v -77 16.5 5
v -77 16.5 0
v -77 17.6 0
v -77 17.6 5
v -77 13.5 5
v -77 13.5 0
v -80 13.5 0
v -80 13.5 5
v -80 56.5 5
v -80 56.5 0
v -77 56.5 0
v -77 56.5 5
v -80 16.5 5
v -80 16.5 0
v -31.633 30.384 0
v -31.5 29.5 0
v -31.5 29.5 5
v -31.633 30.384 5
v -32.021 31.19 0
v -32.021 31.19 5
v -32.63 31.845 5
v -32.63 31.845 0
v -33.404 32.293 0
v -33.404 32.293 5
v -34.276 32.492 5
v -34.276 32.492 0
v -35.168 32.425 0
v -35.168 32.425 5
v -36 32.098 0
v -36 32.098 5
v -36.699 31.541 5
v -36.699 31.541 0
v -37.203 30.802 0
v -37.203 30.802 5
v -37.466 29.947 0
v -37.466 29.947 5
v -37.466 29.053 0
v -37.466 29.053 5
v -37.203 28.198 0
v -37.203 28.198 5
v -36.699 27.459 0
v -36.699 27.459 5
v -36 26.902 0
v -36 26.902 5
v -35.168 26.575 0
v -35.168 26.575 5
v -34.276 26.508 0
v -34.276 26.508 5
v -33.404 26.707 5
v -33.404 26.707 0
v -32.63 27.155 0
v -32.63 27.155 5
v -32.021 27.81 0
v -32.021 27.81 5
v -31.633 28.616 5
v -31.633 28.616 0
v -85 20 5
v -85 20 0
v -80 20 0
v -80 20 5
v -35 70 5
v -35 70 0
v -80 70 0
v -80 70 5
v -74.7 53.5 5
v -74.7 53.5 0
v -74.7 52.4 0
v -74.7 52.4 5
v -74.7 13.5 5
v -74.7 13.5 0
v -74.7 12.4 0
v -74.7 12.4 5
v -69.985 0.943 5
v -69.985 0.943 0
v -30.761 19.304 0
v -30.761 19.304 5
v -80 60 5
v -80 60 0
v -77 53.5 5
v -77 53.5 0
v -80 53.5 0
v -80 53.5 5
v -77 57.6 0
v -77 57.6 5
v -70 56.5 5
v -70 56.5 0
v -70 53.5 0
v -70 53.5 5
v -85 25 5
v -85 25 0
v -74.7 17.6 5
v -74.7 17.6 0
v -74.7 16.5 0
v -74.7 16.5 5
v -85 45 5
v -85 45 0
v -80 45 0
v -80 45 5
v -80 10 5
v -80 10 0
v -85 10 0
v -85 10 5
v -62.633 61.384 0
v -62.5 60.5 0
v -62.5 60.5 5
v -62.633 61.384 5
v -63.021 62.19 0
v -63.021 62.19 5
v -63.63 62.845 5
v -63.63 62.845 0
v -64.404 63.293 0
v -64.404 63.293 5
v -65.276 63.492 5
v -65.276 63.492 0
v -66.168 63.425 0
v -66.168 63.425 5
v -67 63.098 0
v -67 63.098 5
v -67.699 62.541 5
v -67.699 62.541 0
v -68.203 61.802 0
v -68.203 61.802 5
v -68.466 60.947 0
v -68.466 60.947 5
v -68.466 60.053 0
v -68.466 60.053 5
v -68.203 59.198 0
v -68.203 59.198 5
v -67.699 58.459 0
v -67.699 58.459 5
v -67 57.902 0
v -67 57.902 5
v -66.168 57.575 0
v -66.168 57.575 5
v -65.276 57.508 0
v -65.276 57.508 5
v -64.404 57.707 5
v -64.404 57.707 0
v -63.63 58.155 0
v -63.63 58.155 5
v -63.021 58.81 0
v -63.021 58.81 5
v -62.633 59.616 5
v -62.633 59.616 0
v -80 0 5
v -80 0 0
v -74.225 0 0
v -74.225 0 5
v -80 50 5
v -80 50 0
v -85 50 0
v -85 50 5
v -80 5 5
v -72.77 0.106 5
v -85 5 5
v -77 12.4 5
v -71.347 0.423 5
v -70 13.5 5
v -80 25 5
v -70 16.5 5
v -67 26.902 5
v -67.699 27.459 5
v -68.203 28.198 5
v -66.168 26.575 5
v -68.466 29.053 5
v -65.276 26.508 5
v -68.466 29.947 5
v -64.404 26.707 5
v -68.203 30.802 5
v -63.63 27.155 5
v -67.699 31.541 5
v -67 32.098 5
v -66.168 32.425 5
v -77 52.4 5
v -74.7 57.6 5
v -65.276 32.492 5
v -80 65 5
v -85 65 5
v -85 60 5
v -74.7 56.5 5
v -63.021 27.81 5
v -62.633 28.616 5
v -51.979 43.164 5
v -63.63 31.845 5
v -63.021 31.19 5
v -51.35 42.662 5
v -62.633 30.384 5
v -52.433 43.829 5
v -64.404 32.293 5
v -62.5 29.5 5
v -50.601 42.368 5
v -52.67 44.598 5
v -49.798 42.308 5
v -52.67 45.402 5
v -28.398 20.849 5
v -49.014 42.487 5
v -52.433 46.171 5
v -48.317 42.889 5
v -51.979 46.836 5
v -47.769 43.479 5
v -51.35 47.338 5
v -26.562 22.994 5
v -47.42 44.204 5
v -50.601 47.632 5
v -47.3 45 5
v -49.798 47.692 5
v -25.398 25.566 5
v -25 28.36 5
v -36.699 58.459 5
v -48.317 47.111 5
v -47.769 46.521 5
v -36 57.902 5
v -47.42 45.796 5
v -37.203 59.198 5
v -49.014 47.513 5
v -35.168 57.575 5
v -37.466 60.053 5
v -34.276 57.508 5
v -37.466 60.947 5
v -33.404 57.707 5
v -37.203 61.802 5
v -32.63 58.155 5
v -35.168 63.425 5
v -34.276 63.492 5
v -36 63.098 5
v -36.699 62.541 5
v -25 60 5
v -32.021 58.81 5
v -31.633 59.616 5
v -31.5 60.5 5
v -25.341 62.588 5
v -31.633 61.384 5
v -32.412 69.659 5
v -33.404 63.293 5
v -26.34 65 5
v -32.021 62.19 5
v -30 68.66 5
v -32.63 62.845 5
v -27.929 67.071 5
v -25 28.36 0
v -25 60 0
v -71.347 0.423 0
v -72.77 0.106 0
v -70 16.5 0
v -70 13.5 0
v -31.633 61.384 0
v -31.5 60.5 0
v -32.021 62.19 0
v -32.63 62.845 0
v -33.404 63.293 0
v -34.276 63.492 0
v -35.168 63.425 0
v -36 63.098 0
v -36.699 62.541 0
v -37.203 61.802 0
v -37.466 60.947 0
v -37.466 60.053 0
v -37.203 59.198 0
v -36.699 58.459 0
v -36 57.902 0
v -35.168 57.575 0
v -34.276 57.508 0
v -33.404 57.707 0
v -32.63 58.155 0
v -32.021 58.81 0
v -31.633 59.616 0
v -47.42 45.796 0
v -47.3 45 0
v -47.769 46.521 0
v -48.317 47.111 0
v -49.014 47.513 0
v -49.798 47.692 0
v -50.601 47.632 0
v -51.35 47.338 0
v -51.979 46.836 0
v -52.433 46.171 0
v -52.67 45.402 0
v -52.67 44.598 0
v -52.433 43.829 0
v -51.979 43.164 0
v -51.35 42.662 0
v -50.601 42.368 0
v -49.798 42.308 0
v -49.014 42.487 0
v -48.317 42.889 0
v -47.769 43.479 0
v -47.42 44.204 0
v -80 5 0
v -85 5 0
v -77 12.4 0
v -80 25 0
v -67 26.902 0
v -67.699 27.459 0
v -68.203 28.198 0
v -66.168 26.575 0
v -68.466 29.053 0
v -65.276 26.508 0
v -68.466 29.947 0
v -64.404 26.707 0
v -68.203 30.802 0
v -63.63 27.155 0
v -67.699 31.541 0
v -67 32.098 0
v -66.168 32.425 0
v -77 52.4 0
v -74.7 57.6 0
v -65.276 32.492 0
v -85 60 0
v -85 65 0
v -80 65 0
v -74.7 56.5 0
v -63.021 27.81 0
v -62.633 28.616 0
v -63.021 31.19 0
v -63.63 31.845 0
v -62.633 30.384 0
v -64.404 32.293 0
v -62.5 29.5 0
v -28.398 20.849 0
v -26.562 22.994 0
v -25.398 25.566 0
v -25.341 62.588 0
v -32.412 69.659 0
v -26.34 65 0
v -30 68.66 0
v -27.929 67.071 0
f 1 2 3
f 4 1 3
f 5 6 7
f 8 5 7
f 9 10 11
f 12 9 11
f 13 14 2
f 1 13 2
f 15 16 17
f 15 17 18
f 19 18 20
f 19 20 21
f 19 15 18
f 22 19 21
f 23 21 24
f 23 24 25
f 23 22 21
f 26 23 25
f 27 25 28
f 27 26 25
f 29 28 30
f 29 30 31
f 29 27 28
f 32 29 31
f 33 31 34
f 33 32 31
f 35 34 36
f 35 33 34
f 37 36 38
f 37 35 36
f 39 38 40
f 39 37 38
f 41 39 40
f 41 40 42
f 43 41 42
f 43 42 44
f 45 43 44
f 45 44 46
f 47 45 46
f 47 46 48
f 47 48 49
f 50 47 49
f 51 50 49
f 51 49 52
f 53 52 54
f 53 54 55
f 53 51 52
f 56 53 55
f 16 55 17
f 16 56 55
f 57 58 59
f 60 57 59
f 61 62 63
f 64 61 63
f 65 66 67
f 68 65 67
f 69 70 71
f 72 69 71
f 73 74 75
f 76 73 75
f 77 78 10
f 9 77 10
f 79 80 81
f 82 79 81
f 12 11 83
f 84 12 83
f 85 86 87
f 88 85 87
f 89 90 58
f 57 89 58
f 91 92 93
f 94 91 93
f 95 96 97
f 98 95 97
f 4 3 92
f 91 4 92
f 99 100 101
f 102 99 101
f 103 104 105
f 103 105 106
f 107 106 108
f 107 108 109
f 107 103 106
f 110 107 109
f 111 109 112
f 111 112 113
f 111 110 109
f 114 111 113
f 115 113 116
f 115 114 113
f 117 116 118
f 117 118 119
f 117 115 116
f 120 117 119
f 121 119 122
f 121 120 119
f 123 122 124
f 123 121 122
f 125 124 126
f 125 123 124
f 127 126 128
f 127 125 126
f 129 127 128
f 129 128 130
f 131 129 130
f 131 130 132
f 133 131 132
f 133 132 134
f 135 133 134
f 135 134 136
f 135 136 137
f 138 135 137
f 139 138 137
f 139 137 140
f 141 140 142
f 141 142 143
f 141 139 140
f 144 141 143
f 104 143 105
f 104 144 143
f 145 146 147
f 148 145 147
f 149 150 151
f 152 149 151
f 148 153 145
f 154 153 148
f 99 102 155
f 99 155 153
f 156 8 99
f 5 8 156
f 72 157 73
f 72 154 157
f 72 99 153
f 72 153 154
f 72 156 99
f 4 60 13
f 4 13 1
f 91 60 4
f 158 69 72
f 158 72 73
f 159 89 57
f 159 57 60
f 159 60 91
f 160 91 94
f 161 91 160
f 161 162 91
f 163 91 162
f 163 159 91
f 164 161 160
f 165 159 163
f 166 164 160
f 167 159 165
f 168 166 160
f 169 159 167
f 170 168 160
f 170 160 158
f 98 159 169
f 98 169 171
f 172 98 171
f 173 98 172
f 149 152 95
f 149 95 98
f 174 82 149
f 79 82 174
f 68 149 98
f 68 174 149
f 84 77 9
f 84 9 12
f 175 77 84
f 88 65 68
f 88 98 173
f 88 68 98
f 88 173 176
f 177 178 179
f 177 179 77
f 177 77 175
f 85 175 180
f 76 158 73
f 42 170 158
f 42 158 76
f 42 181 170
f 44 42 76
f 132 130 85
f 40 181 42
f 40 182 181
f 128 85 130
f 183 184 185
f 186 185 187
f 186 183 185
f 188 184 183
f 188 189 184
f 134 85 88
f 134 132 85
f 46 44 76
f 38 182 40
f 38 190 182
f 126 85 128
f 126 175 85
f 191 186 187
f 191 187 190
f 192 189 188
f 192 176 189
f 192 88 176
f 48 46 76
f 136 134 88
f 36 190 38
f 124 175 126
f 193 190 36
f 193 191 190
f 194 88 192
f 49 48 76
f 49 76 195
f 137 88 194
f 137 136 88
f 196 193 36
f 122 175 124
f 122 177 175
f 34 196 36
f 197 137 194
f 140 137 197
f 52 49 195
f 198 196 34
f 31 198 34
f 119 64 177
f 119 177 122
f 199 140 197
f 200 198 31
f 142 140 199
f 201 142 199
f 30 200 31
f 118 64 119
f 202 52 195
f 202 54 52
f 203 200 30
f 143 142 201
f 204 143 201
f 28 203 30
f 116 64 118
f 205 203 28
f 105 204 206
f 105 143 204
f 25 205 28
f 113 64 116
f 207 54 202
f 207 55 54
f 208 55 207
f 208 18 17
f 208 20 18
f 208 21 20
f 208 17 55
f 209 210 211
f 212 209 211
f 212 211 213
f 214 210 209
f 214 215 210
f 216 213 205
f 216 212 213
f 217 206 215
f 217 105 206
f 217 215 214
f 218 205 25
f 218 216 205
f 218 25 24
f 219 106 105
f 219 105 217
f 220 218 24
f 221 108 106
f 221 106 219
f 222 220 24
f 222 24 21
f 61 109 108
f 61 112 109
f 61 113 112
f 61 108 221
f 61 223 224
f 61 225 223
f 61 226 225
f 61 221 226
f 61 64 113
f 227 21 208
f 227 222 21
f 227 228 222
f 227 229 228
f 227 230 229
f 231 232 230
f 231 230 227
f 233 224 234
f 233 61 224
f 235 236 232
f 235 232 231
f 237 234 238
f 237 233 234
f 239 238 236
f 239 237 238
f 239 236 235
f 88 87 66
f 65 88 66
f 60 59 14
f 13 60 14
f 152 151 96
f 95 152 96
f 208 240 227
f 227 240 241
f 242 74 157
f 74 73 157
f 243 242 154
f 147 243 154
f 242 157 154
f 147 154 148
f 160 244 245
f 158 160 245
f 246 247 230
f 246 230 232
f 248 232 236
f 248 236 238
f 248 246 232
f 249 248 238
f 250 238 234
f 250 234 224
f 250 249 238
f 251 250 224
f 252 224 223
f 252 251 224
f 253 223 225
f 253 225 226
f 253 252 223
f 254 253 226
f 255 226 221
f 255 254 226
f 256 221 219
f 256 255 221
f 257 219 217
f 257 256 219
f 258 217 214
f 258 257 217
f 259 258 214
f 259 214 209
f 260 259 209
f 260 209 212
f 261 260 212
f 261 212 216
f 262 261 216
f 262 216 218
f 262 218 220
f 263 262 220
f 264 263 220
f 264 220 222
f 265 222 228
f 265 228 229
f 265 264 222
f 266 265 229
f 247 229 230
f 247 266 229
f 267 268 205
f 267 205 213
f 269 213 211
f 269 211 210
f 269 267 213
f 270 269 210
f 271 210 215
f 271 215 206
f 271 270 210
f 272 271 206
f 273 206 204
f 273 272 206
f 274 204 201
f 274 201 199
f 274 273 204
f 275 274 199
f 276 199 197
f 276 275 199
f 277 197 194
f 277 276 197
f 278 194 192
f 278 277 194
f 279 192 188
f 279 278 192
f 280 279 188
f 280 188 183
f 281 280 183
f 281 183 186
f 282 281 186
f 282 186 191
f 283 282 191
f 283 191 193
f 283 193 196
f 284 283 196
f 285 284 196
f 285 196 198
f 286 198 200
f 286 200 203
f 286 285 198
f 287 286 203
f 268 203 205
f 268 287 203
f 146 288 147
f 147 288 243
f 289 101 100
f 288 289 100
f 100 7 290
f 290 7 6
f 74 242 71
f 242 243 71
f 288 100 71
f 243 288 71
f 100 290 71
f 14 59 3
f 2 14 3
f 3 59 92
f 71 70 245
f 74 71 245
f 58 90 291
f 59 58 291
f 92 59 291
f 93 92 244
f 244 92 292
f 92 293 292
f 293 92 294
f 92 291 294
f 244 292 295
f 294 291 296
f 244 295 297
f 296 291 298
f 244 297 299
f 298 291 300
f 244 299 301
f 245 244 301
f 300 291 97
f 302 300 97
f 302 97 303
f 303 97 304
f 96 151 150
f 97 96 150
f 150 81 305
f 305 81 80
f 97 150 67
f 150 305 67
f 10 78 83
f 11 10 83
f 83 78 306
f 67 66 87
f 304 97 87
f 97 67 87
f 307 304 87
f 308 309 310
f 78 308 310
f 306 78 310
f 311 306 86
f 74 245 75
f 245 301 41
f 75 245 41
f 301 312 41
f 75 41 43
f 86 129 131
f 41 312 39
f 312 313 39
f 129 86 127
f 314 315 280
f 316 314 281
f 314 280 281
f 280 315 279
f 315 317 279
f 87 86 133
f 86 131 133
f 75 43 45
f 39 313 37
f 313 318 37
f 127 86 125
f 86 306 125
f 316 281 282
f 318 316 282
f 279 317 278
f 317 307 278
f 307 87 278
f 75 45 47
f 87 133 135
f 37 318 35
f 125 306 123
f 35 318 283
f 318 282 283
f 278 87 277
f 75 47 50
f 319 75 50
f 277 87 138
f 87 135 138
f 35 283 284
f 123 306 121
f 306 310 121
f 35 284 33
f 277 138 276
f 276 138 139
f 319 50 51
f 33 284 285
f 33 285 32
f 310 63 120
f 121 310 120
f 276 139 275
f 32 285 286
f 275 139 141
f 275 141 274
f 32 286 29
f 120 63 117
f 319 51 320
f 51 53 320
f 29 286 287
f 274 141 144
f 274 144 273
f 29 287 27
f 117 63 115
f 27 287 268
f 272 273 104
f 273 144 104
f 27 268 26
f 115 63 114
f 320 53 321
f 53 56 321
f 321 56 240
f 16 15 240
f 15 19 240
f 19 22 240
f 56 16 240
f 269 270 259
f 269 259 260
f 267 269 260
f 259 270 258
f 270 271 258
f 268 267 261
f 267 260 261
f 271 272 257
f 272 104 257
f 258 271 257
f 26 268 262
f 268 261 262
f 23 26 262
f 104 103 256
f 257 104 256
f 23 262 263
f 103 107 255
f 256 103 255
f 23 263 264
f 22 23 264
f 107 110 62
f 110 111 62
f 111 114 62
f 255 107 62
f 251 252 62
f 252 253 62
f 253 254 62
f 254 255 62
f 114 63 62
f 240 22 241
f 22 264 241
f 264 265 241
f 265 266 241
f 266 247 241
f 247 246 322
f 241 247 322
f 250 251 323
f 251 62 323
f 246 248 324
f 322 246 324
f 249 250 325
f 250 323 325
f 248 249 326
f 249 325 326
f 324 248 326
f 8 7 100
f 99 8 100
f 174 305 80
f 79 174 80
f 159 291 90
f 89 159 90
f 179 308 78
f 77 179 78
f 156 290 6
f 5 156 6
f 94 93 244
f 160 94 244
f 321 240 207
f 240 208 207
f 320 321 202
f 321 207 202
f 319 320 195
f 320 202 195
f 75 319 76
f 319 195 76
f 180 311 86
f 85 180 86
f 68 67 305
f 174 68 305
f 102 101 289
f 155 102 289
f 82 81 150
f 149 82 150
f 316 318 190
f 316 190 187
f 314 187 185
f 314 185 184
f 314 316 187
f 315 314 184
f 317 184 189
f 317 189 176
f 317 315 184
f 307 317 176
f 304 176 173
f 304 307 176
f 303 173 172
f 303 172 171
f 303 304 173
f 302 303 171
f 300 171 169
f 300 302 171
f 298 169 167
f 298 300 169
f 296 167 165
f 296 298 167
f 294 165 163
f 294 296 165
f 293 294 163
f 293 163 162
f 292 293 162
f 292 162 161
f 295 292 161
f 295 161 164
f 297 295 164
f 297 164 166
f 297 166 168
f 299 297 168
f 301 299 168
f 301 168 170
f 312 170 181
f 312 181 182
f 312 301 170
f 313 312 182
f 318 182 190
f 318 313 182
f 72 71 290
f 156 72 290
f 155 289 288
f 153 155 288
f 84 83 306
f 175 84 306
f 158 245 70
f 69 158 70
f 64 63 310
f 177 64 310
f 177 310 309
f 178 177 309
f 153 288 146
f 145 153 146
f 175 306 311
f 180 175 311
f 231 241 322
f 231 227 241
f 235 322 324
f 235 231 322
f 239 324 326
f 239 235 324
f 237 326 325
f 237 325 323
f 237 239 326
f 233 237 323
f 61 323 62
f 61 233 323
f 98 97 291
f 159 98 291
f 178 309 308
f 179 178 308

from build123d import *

# Parameters (mm, degrees)
SKETCH1_R           = 3
SKETCH1_R_2         = 2.7
BOSS_EXTRUDE1_DEPTH = 5
FILLET1_R           = 10


with BuildPart() as part:
    # Sketch1 → Boss-Extrude1 (new body)
    with BuildSketch(Plane.XY):
        Polygon((-25, 22), (-25, 70), (-80, 70), (-80, 65), (-85, 65), (-85, 60), (-80, 60), (-80, 56.5), (-77, 56.5), (-77, 57.6), (-74.7, 57.6), (-74.7, 56.5), (-70, 56.5), (-70, 53.5), (-74.7, 53.5), (-74.7, 52.4), (-77, 52.4), (-77, 53.5), (-80, 53.5), (-80, 50), (-85, 50), (-85, 45), (-80, 45), (-80, 25), (-85, 25), (-85, 20), (-80, 20), (-80, 16.5), (-77, 16.5), (-77, 17.6), (-74.7, 17.6), (-74.7, 16.5), (-70, 16.5), (-70, 13.5), (-74.7, 13.5), (-74.7, 12.4), (-77, 12.4), (-77, 13.5), (-80, 13.5), (-80, 10), (-85, 10), (-85, 5), (-80, 5), (-80, 0), (-72, 0), align=None)
        with Locations((-65.5, 29.5)):
            Circle(SKETCH1_R, mode=Mode.SUBTRACT)
        with Locations((-34.5, 29.5)):
            Circle(SKETCH1_R, mode=Mode.SUBTRACT)
        with Locations((-50, 45)):
            Circle(SKETCH1_R_2, mode=Mode.SUBTRACT)
        with Locations((-65.5, 60.5)):
            Circle(SKETCH1_R, mode=Mode.SUBTRACT)
        with Locations((-34.5, 60.5)):
            Circle(SKETCH1_R, mode=Mode.SUBTRACT)
    extrude(amount=BOSS_EXTRUDE1_DEPTH)

    # Fillet1
    fillet1_edges = [part.edges().sort_by_distance(p)[0] for p in [
        (-72, 0, 2.5),
        (-25, 70, 2.5),
        (-25, 22, 2.5),
    ]]
    fillet(fillet1_edges, radius=FILLET1_R)


solid = part.part
